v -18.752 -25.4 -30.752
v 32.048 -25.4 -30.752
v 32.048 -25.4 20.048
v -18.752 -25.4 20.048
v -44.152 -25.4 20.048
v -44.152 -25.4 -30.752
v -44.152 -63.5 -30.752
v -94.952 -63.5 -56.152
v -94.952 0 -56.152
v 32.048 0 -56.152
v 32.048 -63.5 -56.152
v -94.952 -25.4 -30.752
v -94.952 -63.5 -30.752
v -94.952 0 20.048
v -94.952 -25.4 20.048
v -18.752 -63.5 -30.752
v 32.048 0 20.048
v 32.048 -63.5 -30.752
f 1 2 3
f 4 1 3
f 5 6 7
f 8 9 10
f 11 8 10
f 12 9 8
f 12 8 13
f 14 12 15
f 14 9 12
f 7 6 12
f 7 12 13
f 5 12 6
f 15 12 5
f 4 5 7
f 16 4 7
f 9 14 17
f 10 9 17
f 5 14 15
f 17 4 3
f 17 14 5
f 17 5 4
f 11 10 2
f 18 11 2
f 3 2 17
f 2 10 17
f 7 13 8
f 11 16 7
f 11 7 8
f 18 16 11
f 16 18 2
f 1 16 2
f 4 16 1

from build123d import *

# Parameters (mm, degrees)
F0_W     = 127
F0_H     = 76.2
F1_DEPTH = 63.5
F2_W     = 38.1
F2_H     = 50.8
F3_DEPTH = 50.8
F4_W     = 38.1
F4_H     = 50.8
F5_DEPTH = 50.8
F7_DEPTH = 76.201


with BuildPart() as f1:
    # F0 (on Front) → F1 (new body)
    with BuildSketch(Plane.XZ):
        with Locations((-31.45163, -18.051595)):
            Rectangle(F0_W, F0_H)
    extrude(amount=F1_DEPTH)

    # F2 (on face) → F3 (cut)
    with BuildSketch(Plane.YZ.offset(32.04837)):
        with Locations((-44.45, -5.351595)):
            Rectangle(F2_W, F2_H)
    extrude(amount=-F3_DEPTH, mode=Mode.SUBTRACT)

    # F4 (on face) → F5 (cut)
    with BuildSketch(Plane(origin=(-94.95163, 0, 0), x_dir=(0, -1, 0), z_dir=(-1, 0, 0))):
        with Locations((44.45, -5.351595)):
            Rectangle(F4_W, F4_H)
    extrude(amount=-F5_DEPTH, mode=Mode.SUBTRACT)

    # F6 (on face) → F7 (cut, through all)
    with BuildSketch(Plane(origin=(-44.15163, 0, 0), x_dir=(0, -1, 0), z_dir=(-1, 0, 0))):
        Polygon((63.5, 20.048405), (25.4, 20.048405), (63.5, -30.751595), align=None)
    extrude(amount=-F7_DEPTH, mode=Mode.SUBTRACT)


solid = f1.part
